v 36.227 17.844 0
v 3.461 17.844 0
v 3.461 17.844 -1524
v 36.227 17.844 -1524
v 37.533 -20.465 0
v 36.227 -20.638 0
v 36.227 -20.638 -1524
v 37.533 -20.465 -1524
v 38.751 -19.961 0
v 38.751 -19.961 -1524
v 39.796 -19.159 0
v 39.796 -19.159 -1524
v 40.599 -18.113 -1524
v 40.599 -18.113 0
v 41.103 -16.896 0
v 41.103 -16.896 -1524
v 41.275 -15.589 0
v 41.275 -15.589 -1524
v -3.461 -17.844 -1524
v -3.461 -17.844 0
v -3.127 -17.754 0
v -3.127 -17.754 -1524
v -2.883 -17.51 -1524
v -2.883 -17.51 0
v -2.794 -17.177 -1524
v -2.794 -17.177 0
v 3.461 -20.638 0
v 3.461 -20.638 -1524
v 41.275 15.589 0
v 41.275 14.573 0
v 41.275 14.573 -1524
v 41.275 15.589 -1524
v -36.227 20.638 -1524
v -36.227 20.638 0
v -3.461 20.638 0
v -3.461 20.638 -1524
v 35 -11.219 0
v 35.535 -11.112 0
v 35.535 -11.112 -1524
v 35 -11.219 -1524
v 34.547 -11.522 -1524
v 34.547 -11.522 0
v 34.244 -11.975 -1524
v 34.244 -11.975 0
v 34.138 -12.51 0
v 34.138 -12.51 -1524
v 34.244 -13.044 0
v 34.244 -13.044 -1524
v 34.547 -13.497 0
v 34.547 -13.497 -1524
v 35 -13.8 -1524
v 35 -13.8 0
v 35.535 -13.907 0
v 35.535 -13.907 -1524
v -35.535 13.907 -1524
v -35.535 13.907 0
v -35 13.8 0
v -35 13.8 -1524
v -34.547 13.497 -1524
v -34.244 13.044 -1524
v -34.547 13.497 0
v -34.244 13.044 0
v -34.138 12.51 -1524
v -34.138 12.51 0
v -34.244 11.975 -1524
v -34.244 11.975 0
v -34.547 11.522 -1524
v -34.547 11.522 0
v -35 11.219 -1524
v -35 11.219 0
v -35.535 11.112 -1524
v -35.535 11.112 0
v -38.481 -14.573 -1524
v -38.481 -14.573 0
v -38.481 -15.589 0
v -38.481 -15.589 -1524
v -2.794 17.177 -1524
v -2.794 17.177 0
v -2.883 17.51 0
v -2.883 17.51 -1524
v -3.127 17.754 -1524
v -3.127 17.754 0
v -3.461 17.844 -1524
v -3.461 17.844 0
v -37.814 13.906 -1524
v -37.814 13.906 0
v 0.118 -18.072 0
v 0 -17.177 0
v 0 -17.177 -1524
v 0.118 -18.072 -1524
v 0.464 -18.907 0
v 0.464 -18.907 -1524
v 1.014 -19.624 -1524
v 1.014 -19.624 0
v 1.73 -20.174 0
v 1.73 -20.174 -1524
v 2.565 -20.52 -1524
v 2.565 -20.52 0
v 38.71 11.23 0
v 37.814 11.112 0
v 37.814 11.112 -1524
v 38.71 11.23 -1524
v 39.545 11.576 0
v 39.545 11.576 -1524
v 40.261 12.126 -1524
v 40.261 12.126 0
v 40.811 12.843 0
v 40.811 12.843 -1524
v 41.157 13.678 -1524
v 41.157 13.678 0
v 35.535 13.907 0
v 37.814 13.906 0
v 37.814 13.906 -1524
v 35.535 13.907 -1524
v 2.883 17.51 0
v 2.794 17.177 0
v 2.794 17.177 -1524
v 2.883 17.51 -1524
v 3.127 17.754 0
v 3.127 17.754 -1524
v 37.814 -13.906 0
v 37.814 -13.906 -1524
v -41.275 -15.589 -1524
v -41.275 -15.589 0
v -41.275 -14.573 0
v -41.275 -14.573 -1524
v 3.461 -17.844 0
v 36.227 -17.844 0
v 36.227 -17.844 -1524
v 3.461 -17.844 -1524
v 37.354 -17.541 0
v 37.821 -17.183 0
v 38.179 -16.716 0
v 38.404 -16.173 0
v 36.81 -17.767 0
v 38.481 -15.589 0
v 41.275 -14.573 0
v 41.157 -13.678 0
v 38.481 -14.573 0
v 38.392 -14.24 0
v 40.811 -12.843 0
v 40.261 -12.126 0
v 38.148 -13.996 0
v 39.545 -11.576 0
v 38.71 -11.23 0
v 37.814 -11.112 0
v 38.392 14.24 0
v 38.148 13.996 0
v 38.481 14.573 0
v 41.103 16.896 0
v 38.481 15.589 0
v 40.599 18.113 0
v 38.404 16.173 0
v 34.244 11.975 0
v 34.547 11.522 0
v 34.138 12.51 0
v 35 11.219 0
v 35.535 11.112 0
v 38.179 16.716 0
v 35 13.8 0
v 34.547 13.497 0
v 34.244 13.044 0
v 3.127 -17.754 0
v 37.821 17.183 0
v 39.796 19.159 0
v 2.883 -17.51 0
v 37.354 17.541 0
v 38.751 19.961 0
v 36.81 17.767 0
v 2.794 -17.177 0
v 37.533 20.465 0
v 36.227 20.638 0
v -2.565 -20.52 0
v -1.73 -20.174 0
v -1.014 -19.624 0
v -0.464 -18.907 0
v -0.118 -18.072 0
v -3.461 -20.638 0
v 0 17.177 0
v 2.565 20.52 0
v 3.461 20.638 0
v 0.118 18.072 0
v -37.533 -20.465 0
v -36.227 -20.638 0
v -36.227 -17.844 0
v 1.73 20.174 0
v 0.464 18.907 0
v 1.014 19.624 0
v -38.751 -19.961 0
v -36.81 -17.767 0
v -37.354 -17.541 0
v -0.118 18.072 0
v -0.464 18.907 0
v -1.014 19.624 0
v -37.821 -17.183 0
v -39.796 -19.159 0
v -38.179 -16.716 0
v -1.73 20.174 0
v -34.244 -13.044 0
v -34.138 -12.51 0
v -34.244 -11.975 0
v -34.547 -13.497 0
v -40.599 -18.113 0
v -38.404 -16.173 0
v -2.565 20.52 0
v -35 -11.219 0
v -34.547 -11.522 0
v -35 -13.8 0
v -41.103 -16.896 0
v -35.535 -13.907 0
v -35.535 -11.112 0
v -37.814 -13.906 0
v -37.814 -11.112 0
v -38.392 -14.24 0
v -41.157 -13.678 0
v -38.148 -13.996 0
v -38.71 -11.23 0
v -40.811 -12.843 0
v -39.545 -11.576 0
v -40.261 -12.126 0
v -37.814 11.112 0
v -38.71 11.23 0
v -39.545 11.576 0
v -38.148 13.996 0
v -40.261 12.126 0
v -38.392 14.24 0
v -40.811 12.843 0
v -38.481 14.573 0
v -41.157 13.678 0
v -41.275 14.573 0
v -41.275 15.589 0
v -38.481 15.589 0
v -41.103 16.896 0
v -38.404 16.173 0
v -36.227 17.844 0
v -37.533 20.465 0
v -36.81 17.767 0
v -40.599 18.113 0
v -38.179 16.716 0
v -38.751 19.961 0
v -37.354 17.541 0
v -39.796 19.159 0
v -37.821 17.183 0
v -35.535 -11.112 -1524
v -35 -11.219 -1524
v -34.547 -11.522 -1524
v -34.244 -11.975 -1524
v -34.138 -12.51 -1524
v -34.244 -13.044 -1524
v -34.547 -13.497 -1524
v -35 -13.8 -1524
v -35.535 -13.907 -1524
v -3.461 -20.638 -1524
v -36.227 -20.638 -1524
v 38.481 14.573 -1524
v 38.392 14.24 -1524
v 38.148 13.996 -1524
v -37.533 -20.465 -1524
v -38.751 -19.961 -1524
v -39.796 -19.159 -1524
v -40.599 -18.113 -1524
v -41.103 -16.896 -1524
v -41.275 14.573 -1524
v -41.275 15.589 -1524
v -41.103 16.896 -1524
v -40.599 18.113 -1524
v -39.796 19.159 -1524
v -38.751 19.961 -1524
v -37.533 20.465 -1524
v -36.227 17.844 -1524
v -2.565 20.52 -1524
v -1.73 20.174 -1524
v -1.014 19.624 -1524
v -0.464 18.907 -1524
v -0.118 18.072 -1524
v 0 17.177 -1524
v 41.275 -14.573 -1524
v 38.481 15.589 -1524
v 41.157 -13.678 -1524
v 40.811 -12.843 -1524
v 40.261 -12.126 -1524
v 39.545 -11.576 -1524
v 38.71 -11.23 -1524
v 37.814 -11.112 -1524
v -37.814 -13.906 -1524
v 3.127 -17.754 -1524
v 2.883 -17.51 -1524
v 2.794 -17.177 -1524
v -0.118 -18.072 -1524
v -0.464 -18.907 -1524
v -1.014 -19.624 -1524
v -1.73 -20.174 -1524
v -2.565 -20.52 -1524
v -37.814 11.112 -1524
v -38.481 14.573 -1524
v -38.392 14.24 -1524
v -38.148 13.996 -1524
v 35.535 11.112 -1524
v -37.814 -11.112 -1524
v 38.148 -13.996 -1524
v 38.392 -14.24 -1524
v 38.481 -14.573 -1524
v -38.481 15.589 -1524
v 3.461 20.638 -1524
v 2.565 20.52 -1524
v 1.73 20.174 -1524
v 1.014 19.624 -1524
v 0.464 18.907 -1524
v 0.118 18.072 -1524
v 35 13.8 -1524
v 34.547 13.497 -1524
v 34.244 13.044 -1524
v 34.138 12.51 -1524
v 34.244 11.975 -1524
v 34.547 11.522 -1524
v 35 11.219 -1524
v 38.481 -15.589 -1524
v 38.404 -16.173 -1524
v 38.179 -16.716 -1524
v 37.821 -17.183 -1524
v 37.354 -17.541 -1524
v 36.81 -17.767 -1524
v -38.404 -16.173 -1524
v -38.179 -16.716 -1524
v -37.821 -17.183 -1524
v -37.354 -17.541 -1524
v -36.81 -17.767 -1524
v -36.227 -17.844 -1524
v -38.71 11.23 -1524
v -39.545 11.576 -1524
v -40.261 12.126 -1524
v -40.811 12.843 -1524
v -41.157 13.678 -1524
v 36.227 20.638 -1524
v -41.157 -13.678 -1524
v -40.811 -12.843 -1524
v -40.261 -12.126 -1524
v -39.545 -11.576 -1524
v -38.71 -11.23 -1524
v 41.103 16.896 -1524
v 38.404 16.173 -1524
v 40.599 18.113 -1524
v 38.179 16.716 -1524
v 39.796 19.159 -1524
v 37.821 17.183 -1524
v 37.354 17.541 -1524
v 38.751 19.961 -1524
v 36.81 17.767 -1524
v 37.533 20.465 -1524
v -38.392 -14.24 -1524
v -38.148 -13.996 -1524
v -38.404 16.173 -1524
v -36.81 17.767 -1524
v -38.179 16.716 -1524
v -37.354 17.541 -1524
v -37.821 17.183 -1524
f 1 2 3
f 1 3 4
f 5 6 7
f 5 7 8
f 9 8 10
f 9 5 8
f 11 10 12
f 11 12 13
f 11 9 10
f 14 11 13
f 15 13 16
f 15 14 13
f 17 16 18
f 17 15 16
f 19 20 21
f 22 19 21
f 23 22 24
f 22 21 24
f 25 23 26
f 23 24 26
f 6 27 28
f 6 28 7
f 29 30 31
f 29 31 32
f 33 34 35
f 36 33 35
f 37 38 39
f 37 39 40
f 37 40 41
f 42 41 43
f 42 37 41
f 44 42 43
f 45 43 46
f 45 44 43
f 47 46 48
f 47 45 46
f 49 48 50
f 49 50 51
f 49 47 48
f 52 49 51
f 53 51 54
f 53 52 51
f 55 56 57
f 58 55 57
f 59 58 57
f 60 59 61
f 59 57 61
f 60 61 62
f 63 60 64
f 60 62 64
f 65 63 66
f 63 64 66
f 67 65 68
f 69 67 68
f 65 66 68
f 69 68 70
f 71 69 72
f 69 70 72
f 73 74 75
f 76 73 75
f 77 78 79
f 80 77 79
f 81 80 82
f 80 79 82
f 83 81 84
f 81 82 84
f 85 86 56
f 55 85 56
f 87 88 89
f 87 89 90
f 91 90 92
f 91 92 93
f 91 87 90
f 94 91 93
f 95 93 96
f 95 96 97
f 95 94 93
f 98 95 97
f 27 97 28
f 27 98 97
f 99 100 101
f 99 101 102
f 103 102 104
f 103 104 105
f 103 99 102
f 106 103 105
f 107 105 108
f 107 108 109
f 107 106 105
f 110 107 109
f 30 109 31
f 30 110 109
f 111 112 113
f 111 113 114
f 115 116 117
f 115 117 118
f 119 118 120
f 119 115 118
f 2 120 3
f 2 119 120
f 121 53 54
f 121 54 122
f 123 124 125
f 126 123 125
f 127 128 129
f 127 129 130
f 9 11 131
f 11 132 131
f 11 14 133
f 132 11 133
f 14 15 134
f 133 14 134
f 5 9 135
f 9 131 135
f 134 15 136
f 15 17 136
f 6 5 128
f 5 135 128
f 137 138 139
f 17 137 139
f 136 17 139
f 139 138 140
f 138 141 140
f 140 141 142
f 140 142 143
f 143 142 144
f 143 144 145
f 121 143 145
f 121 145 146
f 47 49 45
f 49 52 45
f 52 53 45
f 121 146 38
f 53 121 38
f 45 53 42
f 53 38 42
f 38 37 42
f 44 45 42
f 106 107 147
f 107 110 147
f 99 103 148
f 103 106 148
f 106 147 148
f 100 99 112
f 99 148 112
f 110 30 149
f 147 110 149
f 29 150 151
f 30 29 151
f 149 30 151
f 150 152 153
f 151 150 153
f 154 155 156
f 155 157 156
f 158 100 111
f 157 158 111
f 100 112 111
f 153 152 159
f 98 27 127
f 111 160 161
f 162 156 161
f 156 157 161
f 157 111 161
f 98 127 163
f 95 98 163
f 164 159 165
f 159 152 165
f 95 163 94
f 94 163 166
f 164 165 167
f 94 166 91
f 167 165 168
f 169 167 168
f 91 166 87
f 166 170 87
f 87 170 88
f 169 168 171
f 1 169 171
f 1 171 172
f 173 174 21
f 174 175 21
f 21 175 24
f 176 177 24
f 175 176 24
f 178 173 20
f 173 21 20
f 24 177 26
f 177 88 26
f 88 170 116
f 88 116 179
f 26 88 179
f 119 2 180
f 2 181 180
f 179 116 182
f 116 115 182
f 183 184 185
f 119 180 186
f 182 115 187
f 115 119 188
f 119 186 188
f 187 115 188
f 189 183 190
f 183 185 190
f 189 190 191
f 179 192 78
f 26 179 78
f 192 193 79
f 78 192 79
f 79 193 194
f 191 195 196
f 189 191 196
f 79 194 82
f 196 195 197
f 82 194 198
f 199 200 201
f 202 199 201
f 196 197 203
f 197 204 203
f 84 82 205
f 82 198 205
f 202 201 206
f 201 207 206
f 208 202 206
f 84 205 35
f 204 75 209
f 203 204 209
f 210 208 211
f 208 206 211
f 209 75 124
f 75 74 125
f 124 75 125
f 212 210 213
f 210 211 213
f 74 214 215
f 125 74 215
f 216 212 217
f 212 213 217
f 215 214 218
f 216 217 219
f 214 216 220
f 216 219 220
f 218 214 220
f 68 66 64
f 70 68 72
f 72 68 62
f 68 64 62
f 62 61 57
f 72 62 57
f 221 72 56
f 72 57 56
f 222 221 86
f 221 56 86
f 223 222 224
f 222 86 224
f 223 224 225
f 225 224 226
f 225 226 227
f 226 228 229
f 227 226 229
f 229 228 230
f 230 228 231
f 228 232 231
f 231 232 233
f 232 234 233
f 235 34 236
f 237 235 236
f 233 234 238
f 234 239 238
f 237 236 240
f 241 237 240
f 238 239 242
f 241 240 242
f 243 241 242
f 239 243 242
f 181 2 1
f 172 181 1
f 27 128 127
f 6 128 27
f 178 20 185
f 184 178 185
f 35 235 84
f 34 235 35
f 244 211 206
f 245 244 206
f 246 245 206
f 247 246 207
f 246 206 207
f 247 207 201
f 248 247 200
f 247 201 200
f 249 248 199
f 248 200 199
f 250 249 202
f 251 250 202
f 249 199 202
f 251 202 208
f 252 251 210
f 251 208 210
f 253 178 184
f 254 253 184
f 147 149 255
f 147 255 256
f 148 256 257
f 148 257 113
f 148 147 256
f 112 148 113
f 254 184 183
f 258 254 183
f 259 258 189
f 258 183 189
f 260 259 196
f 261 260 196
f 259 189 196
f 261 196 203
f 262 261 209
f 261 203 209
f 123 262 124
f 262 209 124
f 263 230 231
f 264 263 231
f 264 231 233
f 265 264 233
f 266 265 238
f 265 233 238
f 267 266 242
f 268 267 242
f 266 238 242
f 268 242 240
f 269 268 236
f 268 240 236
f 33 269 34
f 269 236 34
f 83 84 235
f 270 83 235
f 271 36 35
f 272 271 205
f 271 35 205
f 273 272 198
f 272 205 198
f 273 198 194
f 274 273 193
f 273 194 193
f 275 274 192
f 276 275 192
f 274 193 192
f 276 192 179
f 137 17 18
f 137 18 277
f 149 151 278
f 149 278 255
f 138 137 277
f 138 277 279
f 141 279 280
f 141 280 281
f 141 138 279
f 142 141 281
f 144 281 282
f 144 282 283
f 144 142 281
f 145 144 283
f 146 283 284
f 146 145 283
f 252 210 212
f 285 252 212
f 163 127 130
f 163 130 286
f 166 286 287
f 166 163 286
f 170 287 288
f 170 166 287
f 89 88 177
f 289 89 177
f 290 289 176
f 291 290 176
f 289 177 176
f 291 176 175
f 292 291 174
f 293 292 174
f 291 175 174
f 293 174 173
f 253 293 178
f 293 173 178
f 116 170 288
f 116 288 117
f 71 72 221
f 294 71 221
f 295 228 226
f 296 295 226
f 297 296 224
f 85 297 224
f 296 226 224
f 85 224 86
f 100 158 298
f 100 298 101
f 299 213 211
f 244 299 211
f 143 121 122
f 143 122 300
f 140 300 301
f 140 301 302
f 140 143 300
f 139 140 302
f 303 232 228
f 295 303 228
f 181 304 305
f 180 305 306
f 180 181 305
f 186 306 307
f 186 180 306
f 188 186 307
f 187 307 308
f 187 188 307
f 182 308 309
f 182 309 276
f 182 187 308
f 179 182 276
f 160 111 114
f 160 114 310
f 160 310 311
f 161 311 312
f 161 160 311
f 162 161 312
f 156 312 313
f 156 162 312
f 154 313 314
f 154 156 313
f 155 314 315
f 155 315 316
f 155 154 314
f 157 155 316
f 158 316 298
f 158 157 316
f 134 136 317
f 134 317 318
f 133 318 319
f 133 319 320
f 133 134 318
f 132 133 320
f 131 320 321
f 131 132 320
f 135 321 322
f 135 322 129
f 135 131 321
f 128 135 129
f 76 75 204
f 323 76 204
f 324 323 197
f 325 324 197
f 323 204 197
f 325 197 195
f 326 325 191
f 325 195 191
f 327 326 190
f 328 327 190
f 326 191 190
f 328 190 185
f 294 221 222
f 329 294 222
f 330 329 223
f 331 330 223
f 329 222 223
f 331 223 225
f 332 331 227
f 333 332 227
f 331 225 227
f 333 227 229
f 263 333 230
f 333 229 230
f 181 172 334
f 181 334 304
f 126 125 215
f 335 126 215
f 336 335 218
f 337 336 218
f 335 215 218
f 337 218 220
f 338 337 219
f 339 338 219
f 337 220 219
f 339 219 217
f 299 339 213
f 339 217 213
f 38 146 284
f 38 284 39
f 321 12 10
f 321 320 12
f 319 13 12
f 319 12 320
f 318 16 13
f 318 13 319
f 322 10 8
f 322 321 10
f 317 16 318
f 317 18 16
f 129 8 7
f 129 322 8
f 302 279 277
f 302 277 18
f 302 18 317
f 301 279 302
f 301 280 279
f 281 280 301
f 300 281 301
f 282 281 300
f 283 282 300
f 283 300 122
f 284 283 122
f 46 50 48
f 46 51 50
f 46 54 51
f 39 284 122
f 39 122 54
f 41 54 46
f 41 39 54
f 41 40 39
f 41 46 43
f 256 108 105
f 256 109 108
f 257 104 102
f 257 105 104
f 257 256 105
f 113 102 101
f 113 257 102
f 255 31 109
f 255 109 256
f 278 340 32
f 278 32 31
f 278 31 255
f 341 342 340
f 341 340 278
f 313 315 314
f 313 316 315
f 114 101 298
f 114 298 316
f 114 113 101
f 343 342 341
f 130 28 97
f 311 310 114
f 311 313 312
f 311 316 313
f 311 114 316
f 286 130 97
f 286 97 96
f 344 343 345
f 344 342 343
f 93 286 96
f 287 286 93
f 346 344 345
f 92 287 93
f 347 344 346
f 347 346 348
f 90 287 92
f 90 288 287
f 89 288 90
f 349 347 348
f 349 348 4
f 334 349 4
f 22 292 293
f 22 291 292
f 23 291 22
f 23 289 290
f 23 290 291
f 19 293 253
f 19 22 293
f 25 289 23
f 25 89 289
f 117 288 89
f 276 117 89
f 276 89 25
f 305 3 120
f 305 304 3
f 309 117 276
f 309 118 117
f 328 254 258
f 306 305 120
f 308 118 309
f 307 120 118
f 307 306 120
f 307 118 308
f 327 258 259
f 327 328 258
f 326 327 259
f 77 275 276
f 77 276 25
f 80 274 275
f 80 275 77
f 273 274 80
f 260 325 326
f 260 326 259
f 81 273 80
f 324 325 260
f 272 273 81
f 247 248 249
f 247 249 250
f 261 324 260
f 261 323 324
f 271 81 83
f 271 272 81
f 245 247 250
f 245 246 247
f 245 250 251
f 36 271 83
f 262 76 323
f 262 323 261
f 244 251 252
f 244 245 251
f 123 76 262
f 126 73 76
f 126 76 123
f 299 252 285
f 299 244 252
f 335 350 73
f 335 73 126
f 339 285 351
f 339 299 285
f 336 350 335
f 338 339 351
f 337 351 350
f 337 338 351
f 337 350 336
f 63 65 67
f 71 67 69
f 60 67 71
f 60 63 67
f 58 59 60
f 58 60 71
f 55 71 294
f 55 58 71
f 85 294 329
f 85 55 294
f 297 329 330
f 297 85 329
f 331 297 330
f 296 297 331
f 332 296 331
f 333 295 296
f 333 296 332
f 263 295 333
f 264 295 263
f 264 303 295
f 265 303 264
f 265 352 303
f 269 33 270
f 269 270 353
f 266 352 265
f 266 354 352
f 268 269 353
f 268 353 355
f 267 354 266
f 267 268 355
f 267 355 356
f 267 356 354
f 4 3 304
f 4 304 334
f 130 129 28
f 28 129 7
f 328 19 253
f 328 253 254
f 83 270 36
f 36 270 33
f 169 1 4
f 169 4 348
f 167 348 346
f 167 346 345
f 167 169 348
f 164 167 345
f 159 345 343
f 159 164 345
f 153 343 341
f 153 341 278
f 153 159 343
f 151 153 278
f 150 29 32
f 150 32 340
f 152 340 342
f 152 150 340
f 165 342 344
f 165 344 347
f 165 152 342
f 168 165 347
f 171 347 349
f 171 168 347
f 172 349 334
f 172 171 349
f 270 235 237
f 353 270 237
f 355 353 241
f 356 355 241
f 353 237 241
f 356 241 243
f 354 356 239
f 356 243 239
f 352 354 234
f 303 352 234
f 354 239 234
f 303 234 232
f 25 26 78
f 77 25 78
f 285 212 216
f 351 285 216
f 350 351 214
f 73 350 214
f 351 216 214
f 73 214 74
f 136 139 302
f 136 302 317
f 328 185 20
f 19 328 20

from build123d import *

# Parameters (mm, degrees)
BOSS_EXTRUDE1_DEPTH = 1524


with BuildPart() as part:
    # Sketch1 → Boss-Extrude1 (new body)
    with BuildSketch(Plane.XY):
        with BuildLine():
            Line((-36.22675, 20.6375), (-3.46075, 20.6375))
            ThreePointArc((-3.46075, 20.6375), (-1.013630207, 19.623869793), (0, 17.17675))
            Line((0, 17.17675), (0, -17.17675))
            ThreePointArc((0, -17.17675), (-1.013630207, -19.623869793), (-3.46075, -20.6375))
            Line((-3.46075, -20.6375), (-36.22675, -20.6375))
            ThreePointArc((-36.22675, -20.6375), (-39.796401808, -19.158901808), (-41.275, -15.58925))
            Line((-41.275, -15.58925), (-41.275, -14.57325))
            ThreePointArc((-41.275, -14.57325), (-40.261369793, -12.126130207), (-37.81425, -11.1125))
            Line((-37.81425, -11.1125), (-35.5346, -11.1125))
            ThreePointArc((-35.5346, -11.1125), (-34.1376, -12.5095), (-35.5346, -13.9065))
            Line((-35.5346, -13.9065), (-37.81425, -13.9065))
            ThreePointArc((-37.81425, -13.9065), (-38.285713446, -14.101786554), (-38.481, -14.57325))
            Line((-38.481, -14.57325), (-38.481, -15.58925))
            ThreePointArc((-38.481, -15.58925), (-37.820745461, -17.183245461), (-36.22675, -17.8435))
            Line((-36.22675, -17.8435), (-3.46075, -17.8435))
            ThreePointArc((-3.46075, -17.8435), (-2.989286554, -17.648213446), (-2.794, -17.17675))
            Line((-2.794, -17.17675), (-2.794, 17.17675))
            ThreePointArc((-2.794, 17.17675), (-2.989286554, 17.648213446), (-3.46075, 17.8435))
            Line((-3.46075, 17.8435), (-36.22675, 17.8435))
            ThreePointArc((-36.22675, 17.8435), (-37.820745461, 17.183245461), (-38.481, 15.58925))
            Line((-38.481, 15.58925), (-38.481, 14.57325))
            ThreePointArc((-38.481, 14.57325), (-38.285713446, 14.101786554), (-37.81425, 13.9065))
            Line((-37.81425, 13.9065), (-35.5346, 13.9065))
            ThreePointArc((-35.5346, 13.9065), (-34.1376, 12.5095), (-35.5346, 11.1125))
            Line((-35.5346, 11.1125), (-37.81425, 11.1125))
            ThreePointArc((-37.81425, 11.1125), (-40.261369793, 12.126130207), (-41.275, 14.57325))
            Line((-41.275, 14.57325), (-41.275, 15.58925))
            ThreePointArc((-41.275, 15.58925), (-39.796401808, 19.158901808), (-36.22675, 20.6375))
        make_face()
    extrude(amount=-BOSS_EXTRUDE1_DEPTH)


with BuildPart() as body_2:
    # Mirror1: mirrored copy
    add(part.part.mirror(Plane(origin=(0, 17.17675, -1524), x_dir=(0, 0, 1), z_dir=(1, 0, 0))))

    # Combine1: union part
    add(part.part)


solid = body_2.part
